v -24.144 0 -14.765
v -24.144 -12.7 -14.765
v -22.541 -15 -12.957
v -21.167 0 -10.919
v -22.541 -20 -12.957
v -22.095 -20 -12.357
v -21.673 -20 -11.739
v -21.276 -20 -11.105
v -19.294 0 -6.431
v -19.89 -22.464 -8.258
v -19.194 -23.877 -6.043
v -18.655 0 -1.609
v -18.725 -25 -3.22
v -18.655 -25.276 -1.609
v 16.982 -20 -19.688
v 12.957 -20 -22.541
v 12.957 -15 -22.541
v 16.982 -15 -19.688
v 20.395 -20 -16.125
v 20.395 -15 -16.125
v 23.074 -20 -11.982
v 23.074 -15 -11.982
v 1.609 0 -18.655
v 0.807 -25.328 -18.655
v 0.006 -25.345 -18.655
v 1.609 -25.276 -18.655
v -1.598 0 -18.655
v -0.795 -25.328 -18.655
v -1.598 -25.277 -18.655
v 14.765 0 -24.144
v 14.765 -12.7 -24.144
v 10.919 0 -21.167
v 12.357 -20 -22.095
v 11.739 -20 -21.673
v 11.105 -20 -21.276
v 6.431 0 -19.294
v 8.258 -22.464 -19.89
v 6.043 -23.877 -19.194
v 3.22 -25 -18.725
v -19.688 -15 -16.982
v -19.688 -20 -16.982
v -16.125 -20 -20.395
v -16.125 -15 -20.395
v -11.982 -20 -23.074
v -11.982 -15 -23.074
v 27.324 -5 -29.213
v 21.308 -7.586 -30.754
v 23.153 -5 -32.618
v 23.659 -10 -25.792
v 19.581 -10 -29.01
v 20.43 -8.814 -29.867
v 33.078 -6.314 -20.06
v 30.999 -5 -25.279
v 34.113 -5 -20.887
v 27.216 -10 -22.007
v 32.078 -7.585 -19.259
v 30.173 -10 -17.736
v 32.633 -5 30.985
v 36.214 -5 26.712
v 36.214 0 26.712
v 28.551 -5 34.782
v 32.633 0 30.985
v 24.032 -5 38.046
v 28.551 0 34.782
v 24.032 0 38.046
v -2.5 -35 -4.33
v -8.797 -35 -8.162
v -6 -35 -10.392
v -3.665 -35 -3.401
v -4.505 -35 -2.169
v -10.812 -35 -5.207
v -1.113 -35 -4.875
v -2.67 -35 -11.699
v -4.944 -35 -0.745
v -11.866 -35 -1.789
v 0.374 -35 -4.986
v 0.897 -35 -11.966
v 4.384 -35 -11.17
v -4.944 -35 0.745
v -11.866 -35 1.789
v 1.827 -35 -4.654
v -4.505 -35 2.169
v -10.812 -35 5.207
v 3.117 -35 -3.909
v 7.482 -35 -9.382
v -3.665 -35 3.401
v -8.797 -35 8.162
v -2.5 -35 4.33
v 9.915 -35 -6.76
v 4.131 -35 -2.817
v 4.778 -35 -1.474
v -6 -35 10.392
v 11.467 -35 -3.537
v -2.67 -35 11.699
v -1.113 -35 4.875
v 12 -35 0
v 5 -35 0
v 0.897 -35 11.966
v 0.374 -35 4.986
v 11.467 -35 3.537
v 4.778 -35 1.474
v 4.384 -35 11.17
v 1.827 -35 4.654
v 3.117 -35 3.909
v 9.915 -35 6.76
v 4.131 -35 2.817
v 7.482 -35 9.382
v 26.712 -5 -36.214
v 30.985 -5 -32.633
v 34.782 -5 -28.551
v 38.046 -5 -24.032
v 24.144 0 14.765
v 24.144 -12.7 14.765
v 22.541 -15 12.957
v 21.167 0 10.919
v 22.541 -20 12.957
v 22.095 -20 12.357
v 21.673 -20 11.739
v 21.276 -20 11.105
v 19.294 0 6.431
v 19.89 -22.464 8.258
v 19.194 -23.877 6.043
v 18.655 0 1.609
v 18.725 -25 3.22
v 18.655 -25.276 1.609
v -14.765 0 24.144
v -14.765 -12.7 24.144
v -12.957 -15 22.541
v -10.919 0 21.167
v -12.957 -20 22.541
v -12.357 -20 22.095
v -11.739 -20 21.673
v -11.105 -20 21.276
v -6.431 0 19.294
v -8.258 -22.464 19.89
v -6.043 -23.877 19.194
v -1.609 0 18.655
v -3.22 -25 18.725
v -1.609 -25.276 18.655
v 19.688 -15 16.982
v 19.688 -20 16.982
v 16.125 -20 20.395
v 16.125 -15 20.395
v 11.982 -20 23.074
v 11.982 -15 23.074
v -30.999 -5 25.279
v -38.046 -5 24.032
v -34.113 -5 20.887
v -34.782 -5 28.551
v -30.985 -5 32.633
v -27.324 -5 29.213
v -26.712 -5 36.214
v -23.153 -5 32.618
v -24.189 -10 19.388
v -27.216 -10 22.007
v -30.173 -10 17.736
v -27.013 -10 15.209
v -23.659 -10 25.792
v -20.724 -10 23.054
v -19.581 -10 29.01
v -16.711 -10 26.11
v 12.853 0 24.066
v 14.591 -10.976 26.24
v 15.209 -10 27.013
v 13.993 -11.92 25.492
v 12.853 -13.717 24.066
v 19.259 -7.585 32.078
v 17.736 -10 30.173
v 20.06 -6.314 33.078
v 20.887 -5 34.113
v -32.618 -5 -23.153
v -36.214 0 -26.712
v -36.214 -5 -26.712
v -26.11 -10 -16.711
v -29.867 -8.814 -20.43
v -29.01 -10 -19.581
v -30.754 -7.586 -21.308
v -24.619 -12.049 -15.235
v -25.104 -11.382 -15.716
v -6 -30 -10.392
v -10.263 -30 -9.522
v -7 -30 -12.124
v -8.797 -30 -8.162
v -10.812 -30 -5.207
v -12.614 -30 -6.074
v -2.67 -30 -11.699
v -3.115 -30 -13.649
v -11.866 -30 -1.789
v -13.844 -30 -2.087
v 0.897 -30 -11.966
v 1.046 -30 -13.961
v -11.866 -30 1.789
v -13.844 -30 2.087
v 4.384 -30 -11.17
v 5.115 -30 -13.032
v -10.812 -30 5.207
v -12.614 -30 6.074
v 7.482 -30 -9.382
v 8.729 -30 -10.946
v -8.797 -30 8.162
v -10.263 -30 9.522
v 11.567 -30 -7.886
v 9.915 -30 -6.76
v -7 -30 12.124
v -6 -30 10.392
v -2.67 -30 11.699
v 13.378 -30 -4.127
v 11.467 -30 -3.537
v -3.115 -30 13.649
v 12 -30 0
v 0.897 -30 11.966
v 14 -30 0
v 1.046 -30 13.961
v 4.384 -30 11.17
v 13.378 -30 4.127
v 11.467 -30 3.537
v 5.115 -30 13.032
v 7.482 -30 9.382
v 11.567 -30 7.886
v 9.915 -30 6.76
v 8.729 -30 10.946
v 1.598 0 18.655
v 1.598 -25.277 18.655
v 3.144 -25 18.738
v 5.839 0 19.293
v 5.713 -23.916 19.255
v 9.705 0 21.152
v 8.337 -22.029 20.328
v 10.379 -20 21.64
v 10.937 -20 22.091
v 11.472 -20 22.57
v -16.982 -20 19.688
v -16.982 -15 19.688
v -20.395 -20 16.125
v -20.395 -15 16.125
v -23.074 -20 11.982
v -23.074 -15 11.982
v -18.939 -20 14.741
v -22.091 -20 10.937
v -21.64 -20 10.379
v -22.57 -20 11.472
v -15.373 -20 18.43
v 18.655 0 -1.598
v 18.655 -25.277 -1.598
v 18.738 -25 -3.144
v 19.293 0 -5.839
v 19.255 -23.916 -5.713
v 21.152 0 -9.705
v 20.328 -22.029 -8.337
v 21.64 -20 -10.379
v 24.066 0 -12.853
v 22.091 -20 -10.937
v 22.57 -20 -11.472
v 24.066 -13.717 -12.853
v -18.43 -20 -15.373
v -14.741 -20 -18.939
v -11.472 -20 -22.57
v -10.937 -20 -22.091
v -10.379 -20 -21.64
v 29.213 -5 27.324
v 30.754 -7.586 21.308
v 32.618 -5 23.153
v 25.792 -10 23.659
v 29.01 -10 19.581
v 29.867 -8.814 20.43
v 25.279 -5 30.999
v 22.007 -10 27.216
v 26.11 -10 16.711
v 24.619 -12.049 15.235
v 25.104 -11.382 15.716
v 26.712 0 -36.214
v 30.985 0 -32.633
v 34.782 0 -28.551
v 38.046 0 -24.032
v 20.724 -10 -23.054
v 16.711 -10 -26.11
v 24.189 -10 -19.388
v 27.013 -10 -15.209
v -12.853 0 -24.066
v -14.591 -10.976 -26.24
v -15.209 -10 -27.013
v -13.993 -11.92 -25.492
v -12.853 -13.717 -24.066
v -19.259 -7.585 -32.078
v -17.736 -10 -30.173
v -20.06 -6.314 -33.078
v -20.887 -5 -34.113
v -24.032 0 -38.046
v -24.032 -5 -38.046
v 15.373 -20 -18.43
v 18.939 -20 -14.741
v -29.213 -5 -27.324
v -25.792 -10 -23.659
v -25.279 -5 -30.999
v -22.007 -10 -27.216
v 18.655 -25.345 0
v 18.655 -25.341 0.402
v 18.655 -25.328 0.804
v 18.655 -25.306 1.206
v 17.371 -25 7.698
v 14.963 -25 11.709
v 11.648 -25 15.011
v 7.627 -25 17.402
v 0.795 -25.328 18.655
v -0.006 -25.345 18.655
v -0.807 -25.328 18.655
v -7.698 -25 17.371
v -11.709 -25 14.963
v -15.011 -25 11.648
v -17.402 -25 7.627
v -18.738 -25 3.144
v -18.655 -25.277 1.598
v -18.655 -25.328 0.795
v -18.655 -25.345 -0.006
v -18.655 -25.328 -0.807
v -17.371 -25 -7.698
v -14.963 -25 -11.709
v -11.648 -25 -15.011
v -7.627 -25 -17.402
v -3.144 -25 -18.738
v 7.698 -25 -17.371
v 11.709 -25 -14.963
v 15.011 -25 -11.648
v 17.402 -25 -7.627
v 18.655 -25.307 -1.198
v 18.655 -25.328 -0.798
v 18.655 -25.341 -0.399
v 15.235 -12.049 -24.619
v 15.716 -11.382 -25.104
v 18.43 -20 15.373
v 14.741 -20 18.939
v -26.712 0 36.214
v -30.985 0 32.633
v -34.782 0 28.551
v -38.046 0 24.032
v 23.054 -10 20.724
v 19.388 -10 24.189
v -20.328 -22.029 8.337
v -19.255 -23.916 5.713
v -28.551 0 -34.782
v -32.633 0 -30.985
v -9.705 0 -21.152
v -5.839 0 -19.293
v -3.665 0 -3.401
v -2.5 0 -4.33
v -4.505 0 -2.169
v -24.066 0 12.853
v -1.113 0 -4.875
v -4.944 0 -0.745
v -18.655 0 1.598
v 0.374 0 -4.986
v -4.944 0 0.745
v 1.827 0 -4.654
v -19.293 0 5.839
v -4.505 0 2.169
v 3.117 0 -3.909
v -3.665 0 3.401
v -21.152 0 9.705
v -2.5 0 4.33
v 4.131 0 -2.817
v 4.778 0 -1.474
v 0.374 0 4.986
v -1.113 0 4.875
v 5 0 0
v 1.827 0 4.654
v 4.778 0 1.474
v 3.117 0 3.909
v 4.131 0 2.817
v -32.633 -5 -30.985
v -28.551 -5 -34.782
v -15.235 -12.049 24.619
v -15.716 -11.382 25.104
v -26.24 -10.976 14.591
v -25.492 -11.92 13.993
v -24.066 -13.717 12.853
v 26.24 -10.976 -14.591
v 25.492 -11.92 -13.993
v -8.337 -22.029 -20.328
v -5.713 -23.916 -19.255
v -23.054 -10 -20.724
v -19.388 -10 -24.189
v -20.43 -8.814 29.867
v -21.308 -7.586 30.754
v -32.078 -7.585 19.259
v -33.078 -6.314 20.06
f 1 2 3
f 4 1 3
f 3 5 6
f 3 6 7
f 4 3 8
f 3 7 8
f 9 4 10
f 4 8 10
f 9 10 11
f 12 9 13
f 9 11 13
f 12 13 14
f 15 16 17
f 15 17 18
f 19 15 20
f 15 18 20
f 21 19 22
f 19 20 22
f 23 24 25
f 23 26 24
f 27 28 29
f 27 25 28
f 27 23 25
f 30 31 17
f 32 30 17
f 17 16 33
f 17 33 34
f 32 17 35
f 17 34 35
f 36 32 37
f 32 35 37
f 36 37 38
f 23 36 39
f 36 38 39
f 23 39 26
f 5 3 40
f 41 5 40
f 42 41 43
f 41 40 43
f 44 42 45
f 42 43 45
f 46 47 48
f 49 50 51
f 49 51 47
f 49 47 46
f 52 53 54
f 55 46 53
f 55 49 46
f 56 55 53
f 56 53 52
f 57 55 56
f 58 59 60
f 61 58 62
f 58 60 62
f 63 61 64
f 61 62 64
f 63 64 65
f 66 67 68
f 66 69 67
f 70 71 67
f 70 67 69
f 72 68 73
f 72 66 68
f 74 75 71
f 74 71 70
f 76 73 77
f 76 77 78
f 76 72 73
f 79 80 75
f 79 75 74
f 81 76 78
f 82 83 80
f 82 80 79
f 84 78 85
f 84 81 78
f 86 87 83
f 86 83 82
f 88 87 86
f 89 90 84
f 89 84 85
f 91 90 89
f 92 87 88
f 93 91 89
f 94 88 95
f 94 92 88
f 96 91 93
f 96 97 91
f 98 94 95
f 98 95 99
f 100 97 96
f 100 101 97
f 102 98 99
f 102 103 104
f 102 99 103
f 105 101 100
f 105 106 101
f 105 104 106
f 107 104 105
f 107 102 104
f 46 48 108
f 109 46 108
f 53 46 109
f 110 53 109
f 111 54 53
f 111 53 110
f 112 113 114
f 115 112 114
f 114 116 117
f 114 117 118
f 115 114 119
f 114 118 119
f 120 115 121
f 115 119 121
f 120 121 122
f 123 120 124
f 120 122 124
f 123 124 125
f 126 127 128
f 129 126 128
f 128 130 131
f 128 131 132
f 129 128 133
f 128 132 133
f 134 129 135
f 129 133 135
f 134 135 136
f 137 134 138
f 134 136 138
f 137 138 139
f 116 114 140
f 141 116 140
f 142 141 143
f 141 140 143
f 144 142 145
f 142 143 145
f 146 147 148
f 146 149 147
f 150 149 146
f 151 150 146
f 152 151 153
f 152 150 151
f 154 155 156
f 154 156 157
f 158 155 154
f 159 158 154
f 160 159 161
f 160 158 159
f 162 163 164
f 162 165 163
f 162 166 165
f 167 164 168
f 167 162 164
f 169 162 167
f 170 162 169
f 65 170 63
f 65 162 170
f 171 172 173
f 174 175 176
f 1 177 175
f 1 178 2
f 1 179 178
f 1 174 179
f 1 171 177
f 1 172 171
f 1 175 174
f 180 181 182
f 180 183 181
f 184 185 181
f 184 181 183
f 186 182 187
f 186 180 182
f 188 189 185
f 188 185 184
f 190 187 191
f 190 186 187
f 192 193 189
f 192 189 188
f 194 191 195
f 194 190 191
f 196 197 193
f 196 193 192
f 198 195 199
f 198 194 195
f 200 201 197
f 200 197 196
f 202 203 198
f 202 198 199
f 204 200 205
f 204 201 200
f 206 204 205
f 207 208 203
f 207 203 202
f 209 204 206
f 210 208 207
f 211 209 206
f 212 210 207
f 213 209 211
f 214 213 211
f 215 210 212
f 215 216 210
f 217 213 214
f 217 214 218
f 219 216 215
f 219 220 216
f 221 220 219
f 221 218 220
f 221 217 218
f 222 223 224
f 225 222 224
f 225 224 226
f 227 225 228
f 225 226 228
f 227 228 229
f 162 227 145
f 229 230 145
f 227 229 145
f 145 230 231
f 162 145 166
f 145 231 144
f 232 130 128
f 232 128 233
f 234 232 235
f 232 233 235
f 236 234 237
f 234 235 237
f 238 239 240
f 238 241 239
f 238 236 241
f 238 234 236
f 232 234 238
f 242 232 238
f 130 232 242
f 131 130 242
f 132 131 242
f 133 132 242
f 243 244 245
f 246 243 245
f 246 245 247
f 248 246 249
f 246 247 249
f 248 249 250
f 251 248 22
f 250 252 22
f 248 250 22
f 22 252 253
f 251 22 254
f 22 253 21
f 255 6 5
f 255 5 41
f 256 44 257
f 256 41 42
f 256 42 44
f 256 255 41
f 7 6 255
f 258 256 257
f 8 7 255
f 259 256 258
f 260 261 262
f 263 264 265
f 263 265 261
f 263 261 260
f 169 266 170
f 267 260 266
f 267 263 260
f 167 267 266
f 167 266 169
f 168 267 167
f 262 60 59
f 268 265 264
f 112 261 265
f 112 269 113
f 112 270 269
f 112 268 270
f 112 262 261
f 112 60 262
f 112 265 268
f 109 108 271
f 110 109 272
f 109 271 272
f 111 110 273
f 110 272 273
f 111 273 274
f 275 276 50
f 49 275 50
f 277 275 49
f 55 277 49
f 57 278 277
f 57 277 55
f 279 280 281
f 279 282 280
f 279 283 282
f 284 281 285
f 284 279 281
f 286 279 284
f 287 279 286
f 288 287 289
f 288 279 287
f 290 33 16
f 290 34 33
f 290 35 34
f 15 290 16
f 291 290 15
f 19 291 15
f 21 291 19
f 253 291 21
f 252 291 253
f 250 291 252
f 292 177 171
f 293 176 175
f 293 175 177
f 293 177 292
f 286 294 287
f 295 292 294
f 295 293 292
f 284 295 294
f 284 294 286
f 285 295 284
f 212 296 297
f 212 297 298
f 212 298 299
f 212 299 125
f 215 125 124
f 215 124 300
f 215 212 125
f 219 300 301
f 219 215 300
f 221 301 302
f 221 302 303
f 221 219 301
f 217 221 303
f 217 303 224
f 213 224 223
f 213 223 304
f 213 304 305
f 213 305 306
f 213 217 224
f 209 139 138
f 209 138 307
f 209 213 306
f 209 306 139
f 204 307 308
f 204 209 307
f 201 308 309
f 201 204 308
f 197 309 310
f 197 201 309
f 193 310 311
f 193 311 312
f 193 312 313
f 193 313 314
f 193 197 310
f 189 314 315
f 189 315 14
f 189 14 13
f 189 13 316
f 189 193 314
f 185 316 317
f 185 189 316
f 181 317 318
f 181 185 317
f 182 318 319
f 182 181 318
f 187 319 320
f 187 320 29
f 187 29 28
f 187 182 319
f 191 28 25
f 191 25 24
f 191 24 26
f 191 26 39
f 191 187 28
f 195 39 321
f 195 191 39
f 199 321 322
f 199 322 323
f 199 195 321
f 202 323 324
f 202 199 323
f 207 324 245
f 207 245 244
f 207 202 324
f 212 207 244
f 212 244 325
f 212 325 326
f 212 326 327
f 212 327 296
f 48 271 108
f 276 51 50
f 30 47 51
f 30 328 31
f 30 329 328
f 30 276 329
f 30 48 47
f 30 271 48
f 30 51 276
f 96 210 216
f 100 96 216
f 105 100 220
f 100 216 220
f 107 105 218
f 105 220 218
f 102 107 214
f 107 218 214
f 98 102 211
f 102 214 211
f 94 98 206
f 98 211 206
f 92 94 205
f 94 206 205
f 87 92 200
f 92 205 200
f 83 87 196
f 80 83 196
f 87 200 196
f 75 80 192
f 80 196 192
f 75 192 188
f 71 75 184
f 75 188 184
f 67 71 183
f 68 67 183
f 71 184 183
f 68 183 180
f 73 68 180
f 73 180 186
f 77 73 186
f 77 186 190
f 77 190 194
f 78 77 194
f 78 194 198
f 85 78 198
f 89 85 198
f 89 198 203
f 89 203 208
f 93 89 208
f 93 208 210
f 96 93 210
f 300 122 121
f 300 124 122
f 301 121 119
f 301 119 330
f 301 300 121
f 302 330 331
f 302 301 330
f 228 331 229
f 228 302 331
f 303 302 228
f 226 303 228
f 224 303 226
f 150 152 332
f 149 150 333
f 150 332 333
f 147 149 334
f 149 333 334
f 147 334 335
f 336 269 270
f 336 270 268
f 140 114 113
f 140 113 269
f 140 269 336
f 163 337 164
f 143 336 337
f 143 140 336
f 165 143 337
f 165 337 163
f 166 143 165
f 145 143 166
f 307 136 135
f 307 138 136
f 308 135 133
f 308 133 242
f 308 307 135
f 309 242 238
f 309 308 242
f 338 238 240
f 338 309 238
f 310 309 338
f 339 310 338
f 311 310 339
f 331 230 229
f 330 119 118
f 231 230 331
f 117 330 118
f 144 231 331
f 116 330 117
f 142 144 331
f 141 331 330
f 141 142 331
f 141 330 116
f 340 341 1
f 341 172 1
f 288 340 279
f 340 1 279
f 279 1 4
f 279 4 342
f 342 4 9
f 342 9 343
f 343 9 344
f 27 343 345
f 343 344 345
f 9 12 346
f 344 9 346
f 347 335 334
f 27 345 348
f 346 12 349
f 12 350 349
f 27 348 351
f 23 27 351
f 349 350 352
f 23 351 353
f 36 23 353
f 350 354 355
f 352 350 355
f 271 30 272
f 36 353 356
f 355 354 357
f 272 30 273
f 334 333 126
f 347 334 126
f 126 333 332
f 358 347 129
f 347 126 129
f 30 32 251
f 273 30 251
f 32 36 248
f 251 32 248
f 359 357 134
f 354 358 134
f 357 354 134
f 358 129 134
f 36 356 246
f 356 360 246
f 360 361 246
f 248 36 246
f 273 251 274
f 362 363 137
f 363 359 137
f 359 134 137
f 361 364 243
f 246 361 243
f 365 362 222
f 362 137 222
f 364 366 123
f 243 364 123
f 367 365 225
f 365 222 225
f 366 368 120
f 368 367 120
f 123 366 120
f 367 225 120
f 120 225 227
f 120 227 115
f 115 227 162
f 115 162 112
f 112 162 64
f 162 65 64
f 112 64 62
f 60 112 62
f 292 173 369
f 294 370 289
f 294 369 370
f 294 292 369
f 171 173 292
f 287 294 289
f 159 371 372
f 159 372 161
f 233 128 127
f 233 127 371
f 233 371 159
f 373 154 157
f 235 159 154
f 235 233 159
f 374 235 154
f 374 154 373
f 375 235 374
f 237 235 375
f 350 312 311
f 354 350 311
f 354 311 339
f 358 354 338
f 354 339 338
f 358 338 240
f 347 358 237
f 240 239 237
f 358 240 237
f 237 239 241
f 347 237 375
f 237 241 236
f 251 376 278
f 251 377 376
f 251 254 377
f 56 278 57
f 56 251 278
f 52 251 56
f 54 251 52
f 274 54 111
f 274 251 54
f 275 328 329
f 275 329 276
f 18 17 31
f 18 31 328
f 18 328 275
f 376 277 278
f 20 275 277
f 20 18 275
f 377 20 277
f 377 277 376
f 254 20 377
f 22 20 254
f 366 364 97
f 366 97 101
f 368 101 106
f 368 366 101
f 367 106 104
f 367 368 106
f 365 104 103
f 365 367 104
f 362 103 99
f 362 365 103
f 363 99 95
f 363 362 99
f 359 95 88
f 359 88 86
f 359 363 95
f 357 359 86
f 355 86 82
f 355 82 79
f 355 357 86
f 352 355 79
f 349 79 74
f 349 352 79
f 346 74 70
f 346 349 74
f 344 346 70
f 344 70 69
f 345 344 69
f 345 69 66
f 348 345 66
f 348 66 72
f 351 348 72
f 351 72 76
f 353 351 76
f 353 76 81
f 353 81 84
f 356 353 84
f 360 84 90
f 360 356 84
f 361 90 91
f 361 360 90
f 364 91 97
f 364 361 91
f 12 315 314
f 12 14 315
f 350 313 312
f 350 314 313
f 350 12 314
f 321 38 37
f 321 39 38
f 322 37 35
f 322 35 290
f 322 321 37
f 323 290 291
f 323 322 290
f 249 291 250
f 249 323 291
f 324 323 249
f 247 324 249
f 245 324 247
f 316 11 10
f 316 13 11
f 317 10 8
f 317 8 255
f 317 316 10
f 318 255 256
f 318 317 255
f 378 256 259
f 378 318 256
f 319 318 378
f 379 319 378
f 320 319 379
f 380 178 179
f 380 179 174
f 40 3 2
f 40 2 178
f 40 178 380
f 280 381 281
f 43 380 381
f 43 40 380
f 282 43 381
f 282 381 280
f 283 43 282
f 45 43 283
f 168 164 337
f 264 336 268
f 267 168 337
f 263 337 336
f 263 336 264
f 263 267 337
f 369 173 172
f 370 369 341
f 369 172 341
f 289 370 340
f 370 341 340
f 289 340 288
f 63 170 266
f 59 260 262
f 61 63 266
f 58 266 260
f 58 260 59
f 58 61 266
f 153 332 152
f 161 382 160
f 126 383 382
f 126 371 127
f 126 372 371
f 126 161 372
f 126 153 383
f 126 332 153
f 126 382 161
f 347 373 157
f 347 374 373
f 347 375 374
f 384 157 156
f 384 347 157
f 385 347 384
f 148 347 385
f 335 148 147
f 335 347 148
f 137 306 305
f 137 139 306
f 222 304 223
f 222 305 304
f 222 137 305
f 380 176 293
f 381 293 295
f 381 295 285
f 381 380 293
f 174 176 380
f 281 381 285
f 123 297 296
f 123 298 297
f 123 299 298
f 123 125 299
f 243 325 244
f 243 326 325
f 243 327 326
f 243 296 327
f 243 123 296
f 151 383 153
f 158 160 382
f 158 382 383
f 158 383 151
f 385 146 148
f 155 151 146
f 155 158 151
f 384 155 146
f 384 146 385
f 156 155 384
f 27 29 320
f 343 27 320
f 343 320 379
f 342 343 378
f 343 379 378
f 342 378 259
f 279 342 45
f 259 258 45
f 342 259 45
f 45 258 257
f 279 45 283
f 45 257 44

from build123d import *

# Parameters (mm, degrees)
F0_R      = 12
F0_R_2    = 5
F1_DEPTH  = 35
F0_R_3    = 19
F2_DEPTH  = 30
F0_R_4    = 26
F3_DEPTH  = 20
F0_R_5    = 40
F4_DEPTH  = 10
F0_R_6    = 45
F5_DEPTH  = 5
F9_SIZE   = 4.99999
F10_DEPTH = 50
F11_SIZE  = 4.99999
F13_DEPTH = 50
F14_R     = 18.5105769834
F15_R     = 14.4105910726
F16_ANGLE = 90
F17_ANGLE = 180
F18_ANGLE = 270


# Not quite as in the source:
# - a fillet or chamfer is up to 0.001 mm smaller than in the source, because OpenCascade refuses the exact size


with BuildPart() as f1:
    # F0 (on Front) → F1 (new body)
    with BuildSketch(Plane.XZ):
        Circle(F0_R)
        Circle(F0_R_2, mode=Mode.SUBTRACT)
    extrude(amount=F1_DEPTH)

    # F0 (on Front) → F2 (join)
    with BuildSketch(Plane.XZ):
        Circle(F0_R_3)
        Circle(F0_R, mode=Mode.SUBTRACT)
    extrude(amount=F2_DEPTH)

    # F0 (on Front) → F3 (join)
    with BuildSketch(Plane.XZ):
        Circle(F0_R_4)
        Circle(F0_R_3, mode=Mode.SUBTRACT)
    extrude(amount=F3_DEPTH)

    # F0 (on Front) → F4 (join)
    with BuildSketch(Plane.XZ):
        Circle(F0_R_5)
        Circle(F0_R_4, mode=Mode.SUBTRACT)
    extrude(amount=F4_DEPTH)

    # F0 (on Front) → F5 (join)
    with BuildSketch(Plane.XZ):
        Circle(F0_R_6)
        Circle(F0_R_5, mode=Mode.SUBTRACT)
    extrude(amount=F5_DEPTH)

    # F9 (size 5 in the source; OpenCascade refuses exactly that, so slightly less here)
    f9_edges = [f1.edges().sort_by_distance(p)[0] for p in [
        (-40, -10, 0),
        (-26, -10, 0),
    ]]
    chamfer(f9_edges, length=F9_SIZE)

    # F0 (on Front) → F10 (cut)
    with BuildSketch(Plane.XZ):
        Circle(F0_R_2)
    extrude(amount=-F10_DEPTH, mode=Mode.SUBTRACT)

    # F11 (size 5 in the source; OpenCascade refuses exactly that, so slightly less here)
    f11_edges = [f1.edges().sort_by_distance(p)[0] for p in [
        (-19, -20, 0),
        (19, -25, 0),
        (-19, -30, 0),
    ]]
    chamfer(f11_edges, length=F11_SIZE)


with BuildPart() as f13:
    # F12 (on Front) → F13 (new body)
    with BuildSketch(Plane.XZ):
        Polygon((30.8662448078, 46.592772007), (-38.6121459305, 48.2358410954), (-9.3319928274, 18.6549890786), (8.5259051993, 18.6549890786), align=None)
    extrude(amount=F13_DEPTH)

    # F14
    f14_edges = [f13.edges().sort_by_distance(p)[0] for p in [
        (-9.331993, -25, 18.654989),
    ]]
    fillet(f14_edges, radius=F14_R)

    # F15
    f15_edges = [f13.edges().sort_by_distance(p)[0] for p in [
        (8.525905, -25, 18.654989),
    ]]
    fillet(f15_edges, radius=F15_R)


with BuildPart() as f16_1:
    # F16: copy of F13
    add(f13.part.rotate(Axis((0, -35.1110678166, 0), (0, 1, 0)), F16_ANGLE))


with BuildPart() as f17_1:
    # F17: copy of F13
    add(f13.part.rotate(Axis((0, -20.7477975637, 0), (0, 1, 0)), F17_ANGLE))


with BuildPart() as f18_1:
    # F18: copy of F13
    add(f13.part.rotate(Axis((0, -17.8390480578, 0), (0, 1, 0)), F18_ANGLE))


with BuildPart() as f1_1:
    add(f1.part)

    # F19: cut F13
    add(f13.part, mode=Mode.SUBTRACT)

    # F20: cut F17_1
    add(f17_1.part, mode=Mode.SUBTRACT)

    # F21: cut F16_1
    add(f16_1.part, mode=Mode.SUBTRACT)

    # F22: cut F18_1
    add(f18_1.part, mode=Mode.SUBTRACT)


solid = f1_1.part
